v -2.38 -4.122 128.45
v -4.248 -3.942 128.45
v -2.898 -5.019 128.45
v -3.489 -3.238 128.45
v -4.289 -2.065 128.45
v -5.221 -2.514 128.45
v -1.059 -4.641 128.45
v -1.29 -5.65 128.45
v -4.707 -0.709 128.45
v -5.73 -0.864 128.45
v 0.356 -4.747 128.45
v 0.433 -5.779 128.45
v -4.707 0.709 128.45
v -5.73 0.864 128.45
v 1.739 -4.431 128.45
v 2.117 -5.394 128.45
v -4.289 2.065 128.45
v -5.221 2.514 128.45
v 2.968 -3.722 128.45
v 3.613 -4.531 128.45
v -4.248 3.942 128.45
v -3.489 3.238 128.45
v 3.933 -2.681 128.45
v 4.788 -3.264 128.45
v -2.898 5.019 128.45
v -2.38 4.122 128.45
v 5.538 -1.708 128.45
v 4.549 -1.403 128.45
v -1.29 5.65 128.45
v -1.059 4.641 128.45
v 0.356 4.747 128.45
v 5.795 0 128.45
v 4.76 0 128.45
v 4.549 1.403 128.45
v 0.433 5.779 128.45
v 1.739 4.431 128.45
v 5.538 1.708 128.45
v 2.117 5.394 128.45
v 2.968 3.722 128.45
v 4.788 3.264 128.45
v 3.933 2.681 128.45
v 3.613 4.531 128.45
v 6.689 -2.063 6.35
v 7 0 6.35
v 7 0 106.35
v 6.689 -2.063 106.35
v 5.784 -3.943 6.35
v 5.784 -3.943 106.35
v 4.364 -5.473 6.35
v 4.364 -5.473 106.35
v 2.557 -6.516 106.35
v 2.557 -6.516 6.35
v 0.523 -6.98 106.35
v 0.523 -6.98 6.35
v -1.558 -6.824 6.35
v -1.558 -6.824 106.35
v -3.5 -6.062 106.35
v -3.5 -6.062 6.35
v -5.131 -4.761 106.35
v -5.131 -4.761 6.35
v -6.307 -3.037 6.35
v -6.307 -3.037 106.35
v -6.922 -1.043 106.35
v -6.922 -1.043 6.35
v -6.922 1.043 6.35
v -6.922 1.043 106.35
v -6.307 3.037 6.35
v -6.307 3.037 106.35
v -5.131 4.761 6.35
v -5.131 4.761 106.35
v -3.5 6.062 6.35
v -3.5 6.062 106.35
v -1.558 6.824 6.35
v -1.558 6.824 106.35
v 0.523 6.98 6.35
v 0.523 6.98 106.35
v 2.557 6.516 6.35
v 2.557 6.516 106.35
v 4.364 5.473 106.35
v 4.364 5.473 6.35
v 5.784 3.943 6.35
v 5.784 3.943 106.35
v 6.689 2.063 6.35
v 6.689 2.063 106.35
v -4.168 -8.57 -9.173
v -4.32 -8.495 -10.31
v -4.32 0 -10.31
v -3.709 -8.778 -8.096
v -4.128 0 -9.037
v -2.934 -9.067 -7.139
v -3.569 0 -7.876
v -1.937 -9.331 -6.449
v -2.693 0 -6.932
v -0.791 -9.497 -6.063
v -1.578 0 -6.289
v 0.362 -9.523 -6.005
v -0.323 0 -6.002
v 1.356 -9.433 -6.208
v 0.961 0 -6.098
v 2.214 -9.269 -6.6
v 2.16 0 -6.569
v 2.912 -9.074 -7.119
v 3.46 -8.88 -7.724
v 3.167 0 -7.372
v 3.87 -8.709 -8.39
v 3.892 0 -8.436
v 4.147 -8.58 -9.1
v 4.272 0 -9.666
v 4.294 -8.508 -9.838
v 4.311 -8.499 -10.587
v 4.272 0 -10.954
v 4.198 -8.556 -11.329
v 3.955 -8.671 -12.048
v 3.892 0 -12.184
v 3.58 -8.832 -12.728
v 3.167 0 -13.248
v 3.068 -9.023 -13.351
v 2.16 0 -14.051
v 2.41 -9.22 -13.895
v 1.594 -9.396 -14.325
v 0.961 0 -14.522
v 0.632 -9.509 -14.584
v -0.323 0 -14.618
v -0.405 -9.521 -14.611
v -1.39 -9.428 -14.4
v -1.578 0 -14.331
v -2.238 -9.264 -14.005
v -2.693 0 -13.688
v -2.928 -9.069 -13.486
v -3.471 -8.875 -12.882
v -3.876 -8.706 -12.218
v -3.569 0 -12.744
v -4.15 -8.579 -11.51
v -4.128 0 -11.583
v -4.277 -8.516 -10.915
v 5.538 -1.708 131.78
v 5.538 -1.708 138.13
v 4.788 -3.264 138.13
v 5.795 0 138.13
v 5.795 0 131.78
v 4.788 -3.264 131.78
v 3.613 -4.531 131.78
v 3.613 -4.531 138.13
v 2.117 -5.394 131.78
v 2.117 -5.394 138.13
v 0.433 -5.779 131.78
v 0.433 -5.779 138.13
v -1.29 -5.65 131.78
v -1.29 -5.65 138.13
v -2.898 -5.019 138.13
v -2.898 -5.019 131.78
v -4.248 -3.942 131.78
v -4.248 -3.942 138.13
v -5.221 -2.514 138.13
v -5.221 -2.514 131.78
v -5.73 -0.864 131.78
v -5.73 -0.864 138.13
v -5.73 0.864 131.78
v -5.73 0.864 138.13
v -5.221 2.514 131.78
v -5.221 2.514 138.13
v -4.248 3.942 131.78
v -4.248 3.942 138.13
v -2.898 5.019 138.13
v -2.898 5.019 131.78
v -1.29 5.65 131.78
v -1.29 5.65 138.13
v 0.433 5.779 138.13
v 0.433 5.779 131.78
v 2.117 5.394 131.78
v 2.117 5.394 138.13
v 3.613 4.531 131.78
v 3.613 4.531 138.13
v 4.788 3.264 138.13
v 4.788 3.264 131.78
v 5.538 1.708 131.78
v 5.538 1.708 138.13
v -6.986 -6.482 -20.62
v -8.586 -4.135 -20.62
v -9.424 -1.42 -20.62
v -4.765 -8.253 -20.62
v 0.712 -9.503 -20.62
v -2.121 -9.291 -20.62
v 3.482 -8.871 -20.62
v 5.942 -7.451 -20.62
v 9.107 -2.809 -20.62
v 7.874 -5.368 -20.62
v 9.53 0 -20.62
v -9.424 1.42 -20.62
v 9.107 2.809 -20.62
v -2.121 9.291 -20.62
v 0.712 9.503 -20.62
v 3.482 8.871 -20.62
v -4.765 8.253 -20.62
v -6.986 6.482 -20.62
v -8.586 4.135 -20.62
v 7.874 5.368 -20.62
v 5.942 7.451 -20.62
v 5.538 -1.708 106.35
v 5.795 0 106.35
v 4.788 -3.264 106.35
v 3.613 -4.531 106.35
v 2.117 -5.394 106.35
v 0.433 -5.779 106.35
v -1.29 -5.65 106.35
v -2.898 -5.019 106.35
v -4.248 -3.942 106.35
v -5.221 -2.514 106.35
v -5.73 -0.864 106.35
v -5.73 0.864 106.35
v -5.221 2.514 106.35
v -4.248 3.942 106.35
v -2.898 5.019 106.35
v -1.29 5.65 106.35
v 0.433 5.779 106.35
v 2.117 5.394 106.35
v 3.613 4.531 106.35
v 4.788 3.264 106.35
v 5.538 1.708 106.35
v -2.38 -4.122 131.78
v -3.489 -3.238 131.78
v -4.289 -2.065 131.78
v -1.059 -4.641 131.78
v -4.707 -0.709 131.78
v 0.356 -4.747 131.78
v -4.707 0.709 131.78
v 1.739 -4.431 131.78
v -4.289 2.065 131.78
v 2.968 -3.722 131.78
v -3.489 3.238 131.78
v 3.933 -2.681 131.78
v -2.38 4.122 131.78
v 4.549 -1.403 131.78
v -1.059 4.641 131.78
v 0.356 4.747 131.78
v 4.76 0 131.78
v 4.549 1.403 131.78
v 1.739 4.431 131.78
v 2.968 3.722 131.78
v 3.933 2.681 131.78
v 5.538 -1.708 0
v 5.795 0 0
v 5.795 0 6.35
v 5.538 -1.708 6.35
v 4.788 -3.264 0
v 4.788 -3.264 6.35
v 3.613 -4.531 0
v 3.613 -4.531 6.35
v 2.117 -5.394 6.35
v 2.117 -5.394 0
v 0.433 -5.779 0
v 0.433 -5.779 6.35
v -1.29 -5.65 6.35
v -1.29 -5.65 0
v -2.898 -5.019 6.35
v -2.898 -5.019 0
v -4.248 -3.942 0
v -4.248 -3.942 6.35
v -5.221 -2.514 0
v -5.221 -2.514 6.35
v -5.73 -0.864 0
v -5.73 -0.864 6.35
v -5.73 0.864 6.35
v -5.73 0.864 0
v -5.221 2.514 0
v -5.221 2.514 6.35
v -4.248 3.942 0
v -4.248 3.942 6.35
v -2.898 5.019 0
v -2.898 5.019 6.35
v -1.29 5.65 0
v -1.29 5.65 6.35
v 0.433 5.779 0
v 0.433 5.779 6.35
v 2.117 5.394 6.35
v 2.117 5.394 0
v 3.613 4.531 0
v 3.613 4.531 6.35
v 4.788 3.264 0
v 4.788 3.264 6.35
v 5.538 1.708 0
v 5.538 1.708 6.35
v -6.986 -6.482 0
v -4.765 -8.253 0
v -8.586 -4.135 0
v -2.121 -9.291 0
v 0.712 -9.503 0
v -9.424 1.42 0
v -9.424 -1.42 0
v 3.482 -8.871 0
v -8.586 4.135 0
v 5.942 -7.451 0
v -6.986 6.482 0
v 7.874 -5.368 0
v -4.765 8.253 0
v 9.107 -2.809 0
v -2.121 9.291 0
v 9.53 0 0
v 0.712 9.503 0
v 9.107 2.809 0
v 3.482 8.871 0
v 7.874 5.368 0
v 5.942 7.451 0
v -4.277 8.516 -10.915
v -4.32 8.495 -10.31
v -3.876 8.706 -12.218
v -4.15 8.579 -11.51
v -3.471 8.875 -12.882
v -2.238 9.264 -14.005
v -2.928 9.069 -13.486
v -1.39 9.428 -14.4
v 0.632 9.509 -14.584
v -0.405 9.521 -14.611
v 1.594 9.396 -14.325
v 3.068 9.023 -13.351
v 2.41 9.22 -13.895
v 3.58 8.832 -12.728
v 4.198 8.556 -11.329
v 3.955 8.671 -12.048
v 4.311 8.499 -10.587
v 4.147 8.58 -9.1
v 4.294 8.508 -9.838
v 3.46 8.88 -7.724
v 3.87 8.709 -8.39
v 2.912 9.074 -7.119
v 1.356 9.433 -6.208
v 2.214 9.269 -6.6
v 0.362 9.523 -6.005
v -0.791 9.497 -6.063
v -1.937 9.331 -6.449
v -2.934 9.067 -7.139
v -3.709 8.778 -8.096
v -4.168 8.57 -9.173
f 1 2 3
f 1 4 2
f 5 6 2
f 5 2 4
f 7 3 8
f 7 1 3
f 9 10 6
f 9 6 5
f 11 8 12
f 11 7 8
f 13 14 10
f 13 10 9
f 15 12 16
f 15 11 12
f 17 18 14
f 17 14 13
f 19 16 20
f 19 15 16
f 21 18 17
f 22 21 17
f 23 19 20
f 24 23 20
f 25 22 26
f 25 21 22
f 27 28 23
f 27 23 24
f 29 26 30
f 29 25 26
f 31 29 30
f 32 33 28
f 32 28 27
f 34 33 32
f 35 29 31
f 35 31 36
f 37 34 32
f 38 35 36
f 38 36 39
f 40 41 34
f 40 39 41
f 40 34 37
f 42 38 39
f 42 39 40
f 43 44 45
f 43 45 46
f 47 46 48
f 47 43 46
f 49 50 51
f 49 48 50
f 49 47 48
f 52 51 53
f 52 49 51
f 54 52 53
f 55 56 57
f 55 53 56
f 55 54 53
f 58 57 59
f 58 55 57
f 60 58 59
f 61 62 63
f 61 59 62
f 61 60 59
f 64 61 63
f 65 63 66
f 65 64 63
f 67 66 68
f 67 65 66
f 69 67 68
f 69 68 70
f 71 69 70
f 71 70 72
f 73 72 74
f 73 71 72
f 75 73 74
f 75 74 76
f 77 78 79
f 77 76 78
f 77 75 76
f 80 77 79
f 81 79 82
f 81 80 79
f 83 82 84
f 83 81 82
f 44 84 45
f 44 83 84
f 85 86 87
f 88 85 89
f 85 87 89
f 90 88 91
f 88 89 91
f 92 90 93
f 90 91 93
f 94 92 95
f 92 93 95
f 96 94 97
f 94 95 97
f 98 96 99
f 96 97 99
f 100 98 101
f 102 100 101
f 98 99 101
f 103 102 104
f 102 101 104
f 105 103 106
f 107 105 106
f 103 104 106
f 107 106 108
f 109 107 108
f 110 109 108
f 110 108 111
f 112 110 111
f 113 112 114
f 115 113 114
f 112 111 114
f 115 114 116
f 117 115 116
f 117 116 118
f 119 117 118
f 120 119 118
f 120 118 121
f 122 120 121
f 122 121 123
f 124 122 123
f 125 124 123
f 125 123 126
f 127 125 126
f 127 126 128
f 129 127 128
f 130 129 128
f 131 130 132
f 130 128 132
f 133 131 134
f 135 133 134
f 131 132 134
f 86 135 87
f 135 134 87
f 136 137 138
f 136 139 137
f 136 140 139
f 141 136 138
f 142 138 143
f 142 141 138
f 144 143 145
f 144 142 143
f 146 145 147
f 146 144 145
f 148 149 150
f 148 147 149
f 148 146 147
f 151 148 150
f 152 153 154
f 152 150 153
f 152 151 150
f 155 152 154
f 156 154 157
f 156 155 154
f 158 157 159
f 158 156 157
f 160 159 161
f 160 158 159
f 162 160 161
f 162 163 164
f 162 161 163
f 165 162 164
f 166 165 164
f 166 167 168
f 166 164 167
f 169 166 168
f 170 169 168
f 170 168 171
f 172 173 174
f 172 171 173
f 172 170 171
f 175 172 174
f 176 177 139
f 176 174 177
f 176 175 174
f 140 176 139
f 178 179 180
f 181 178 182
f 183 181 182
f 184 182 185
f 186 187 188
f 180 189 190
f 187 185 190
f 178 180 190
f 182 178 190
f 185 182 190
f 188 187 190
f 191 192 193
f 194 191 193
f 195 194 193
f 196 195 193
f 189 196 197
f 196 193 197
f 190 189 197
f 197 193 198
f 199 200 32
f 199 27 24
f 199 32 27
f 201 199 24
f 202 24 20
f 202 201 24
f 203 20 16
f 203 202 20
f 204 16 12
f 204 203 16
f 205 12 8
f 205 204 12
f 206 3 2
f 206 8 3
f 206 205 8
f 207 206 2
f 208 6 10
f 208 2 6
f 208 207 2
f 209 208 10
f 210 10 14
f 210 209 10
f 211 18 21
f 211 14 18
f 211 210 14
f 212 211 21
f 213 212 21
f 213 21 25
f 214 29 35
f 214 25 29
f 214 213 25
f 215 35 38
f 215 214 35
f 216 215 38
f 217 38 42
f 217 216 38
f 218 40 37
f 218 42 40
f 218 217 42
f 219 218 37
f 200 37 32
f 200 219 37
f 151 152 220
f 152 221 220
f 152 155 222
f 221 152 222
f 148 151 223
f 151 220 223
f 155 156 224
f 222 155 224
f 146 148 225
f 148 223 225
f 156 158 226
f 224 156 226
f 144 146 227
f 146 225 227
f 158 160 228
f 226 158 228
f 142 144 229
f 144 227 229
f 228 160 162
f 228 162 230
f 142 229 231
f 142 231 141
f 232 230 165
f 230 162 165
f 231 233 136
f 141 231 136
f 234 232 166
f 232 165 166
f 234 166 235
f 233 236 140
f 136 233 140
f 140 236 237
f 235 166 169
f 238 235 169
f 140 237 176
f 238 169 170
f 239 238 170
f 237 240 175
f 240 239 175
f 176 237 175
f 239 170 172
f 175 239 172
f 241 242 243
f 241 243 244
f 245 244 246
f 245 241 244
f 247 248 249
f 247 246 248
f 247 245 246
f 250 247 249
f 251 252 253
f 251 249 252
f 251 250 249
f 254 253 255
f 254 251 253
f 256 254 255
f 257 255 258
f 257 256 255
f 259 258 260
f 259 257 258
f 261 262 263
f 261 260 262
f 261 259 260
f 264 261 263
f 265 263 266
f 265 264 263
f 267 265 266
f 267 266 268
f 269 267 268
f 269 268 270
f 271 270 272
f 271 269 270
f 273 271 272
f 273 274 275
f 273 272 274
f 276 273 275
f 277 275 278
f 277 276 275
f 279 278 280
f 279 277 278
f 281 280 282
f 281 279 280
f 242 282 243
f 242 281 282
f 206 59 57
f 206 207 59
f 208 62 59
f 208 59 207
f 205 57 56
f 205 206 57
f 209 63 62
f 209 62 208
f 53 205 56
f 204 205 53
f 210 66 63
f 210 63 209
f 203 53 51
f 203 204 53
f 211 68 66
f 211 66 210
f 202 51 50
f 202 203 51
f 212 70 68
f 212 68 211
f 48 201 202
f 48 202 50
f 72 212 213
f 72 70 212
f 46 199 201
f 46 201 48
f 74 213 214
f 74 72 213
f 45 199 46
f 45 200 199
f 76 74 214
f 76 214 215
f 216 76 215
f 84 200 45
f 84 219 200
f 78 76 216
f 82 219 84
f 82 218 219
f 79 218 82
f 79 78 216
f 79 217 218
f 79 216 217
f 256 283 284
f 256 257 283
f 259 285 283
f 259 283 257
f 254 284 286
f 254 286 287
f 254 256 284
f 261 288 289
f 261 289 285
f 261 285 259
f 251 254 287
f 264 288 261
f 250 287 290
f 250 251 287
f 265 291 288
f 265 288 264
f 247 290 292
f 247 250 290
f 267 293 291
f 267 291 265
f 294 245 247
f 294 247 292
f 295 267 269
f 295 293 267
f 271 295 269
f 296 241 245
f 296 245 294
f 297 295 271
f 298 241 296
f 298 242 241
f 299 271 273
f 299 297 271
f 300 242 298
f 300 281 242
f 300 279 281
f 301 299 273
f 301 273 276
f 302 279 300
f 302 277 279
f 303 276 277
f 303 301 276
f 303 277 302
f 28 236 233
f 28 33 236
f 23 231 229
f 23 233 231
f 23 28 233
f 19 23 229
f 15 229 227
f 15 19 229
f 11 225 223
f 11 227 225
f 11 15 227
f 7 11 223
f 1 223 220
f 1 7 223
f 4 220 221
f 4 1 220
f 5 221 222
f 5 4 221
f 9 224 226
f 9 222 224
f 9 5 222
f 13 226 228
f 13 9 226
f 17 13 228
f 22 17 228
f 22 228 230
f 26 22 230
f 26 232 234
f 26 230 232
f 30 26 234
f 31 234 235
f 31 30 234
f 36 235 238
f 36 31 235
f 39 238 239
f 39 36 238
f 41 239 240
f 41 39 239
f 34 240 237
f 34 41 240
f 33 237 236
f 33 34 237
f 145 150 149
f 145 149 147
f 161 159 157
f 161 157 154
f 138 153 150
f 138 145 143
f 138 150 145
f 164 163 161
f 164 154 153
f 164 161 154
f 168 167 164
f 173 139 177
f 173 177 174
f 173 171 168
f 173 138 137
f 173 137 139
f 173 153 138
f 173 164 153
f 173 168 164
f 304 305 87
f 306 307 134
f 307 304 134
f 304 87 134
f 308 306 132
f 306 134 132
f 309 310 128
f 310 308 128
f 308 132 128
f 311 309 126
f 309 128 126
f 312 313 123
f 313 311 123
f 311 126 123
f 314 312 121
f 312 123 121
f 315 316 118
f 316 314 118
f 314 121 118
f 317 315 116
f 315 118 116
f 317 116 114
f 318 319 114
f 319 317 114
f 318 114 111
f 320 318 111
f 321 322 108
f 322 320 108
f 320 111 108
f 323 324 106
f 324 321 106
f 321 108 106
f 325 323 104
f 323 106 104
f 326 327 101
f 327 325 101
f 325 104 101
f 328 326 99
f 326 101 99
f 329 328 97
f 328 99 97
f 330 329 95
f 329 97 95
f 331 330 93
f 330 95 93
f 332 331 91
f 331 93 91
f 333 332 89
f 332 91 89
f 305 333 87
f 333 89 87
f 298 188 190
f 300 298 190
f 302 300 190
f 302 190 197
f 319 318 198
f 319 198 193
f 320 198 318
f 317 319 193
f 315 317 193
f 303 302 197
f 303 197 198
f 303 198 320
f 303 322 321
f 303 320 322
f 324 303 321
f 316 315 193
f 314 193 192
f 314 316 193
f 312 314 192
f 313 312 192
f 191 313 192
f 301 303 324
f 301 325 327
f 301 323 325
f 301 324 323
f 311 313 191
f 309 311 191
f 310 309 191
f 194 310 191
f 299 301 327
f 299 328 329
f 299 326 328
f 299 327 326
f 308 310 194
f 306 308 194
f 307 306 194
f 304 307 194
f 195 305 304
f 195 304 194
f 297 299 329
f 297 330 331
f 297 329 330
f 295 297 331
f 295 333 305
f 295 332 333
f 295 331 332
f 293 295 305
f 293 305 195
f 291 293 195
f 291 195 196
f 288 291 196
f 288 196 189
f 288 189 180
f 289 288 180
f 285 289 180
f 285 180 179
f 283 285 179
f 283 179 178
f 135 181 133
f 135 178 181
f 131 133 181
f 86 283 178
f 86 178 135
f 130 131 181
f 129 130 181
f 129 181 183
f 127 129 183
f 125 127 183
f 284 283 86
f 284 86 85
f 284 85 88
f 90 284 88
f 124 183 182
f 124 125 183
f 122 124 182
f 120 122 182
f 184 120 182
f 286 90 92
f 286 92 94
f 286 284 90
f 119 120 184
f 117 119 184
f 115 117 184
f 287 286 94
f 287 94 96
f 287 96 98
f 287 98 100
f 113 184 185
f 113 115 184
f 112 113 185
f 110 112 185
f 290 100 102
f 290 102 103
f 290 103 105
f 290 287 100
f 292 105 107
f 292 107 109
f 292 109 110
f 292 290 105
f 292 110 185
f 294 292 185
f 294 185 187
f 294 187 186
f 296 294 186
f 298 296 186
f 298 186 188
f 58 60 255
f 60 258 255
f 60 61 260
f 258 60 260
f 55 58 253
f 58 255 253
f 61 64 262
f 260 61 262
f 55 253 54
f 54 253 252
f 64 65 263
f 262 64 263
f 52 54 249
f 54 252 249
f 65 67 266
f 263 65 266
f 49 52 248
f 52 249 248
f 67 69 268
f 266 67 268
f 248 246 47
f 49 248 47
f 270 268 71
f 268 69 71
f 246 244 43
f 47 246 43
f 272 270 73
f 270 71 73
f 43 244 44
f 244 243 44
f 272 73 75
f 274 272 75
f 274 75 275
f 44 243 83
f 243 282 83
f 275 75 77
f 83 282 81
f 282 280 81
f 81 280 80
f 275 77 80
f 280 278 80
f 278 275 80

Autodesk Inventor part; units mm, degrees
ref_plane "YZ Plane" through (0, 0, 0) normal (1, 0, 0) x (0, 1, 0)
ref_plane "XZ Plane" through (0, 0, 0) normal (0, 1, 0) x (-1, 0, 0)
ref_plane "XY Plane" through (0, 0, 0) normal (0, 0, 1) x (1, 0, 0)
sketch "Sketch1" plane through (0, 0, 0) normal (0, 0, 1) x (1, 0, 0)
  circle A0 centre (0, 0) radius 9.53
  dimension "d0" = 19.06
extrude "Extrusion1" add sketch "Sketch1" against normal blind 20.62
sketch "Sketch2" plane through (0, 0, 0) normal (0, 0, 1) x (1, 0, 0)
  circle A0 centre (0, 0) radius 5.795
  dimension "d3" = 11.59
extrude "Extrusion2" add sketch "Sketch2" along normal blind 6.35
sketch "Sketch3" plane through (0, 0, 6.35) normal (0, 0, 1) x (1, 0, 0)
  circle A0 centre (0, 0) radius 7
  dimension "d6" = 14
extrude "Extrusion3" add sketch "Sketch3" along normal blind 100
sketch "Sketch4" plane through (0, 0, 106.35) normal (0, 0, 1) x (1, 0, 0)
  circle A0 centre (0, 0) radius 7 projected
  circle A1 centre (0, 0) radius 7 projected
  circle A2 centre (0, 0) radius 7 projected
  circle A3 centre (0, 0) radius 5.795 projected
extrude "Extrusion4" add sketch "Sketch4" along normal blind 22.1 contours A3
sketch "Sketch5" plane through (0, 0, 128.45) normal (0, 0, 1) x (1, 0, 0)
  circle A0 centre (0, 0) radius 4.76
  dimension "d11" = 9.52
extrude "Extrusion5" add sketch "Sketch5" along normal blind 3.33
sketch "Sketch6" plane through (0, 0, 131.78) normal (0, 0, 1) x (1, 0, 0)
  circle A0 centre (0, 0) radius 5.795 projected
extrude "Extrusion6" add sketch "Sketch6" along normal blind 6.35
sketch "Sketch7" plane through (0, 0, 0) normal (0, 1, 0) x (-1, 0, 0)
  circle A0 centre (0, -10.31) radius 4.32
  point P0 (0, 0)
  dimension "d16" = 8.64
extrude "Extrusion7" cut sketch "Sketch7" along normal mid plane 40.35
thread "Thread1" size "M14x2" class "6g" standard "ANSI Metric M Profile" full length
properties part number "parça3"
